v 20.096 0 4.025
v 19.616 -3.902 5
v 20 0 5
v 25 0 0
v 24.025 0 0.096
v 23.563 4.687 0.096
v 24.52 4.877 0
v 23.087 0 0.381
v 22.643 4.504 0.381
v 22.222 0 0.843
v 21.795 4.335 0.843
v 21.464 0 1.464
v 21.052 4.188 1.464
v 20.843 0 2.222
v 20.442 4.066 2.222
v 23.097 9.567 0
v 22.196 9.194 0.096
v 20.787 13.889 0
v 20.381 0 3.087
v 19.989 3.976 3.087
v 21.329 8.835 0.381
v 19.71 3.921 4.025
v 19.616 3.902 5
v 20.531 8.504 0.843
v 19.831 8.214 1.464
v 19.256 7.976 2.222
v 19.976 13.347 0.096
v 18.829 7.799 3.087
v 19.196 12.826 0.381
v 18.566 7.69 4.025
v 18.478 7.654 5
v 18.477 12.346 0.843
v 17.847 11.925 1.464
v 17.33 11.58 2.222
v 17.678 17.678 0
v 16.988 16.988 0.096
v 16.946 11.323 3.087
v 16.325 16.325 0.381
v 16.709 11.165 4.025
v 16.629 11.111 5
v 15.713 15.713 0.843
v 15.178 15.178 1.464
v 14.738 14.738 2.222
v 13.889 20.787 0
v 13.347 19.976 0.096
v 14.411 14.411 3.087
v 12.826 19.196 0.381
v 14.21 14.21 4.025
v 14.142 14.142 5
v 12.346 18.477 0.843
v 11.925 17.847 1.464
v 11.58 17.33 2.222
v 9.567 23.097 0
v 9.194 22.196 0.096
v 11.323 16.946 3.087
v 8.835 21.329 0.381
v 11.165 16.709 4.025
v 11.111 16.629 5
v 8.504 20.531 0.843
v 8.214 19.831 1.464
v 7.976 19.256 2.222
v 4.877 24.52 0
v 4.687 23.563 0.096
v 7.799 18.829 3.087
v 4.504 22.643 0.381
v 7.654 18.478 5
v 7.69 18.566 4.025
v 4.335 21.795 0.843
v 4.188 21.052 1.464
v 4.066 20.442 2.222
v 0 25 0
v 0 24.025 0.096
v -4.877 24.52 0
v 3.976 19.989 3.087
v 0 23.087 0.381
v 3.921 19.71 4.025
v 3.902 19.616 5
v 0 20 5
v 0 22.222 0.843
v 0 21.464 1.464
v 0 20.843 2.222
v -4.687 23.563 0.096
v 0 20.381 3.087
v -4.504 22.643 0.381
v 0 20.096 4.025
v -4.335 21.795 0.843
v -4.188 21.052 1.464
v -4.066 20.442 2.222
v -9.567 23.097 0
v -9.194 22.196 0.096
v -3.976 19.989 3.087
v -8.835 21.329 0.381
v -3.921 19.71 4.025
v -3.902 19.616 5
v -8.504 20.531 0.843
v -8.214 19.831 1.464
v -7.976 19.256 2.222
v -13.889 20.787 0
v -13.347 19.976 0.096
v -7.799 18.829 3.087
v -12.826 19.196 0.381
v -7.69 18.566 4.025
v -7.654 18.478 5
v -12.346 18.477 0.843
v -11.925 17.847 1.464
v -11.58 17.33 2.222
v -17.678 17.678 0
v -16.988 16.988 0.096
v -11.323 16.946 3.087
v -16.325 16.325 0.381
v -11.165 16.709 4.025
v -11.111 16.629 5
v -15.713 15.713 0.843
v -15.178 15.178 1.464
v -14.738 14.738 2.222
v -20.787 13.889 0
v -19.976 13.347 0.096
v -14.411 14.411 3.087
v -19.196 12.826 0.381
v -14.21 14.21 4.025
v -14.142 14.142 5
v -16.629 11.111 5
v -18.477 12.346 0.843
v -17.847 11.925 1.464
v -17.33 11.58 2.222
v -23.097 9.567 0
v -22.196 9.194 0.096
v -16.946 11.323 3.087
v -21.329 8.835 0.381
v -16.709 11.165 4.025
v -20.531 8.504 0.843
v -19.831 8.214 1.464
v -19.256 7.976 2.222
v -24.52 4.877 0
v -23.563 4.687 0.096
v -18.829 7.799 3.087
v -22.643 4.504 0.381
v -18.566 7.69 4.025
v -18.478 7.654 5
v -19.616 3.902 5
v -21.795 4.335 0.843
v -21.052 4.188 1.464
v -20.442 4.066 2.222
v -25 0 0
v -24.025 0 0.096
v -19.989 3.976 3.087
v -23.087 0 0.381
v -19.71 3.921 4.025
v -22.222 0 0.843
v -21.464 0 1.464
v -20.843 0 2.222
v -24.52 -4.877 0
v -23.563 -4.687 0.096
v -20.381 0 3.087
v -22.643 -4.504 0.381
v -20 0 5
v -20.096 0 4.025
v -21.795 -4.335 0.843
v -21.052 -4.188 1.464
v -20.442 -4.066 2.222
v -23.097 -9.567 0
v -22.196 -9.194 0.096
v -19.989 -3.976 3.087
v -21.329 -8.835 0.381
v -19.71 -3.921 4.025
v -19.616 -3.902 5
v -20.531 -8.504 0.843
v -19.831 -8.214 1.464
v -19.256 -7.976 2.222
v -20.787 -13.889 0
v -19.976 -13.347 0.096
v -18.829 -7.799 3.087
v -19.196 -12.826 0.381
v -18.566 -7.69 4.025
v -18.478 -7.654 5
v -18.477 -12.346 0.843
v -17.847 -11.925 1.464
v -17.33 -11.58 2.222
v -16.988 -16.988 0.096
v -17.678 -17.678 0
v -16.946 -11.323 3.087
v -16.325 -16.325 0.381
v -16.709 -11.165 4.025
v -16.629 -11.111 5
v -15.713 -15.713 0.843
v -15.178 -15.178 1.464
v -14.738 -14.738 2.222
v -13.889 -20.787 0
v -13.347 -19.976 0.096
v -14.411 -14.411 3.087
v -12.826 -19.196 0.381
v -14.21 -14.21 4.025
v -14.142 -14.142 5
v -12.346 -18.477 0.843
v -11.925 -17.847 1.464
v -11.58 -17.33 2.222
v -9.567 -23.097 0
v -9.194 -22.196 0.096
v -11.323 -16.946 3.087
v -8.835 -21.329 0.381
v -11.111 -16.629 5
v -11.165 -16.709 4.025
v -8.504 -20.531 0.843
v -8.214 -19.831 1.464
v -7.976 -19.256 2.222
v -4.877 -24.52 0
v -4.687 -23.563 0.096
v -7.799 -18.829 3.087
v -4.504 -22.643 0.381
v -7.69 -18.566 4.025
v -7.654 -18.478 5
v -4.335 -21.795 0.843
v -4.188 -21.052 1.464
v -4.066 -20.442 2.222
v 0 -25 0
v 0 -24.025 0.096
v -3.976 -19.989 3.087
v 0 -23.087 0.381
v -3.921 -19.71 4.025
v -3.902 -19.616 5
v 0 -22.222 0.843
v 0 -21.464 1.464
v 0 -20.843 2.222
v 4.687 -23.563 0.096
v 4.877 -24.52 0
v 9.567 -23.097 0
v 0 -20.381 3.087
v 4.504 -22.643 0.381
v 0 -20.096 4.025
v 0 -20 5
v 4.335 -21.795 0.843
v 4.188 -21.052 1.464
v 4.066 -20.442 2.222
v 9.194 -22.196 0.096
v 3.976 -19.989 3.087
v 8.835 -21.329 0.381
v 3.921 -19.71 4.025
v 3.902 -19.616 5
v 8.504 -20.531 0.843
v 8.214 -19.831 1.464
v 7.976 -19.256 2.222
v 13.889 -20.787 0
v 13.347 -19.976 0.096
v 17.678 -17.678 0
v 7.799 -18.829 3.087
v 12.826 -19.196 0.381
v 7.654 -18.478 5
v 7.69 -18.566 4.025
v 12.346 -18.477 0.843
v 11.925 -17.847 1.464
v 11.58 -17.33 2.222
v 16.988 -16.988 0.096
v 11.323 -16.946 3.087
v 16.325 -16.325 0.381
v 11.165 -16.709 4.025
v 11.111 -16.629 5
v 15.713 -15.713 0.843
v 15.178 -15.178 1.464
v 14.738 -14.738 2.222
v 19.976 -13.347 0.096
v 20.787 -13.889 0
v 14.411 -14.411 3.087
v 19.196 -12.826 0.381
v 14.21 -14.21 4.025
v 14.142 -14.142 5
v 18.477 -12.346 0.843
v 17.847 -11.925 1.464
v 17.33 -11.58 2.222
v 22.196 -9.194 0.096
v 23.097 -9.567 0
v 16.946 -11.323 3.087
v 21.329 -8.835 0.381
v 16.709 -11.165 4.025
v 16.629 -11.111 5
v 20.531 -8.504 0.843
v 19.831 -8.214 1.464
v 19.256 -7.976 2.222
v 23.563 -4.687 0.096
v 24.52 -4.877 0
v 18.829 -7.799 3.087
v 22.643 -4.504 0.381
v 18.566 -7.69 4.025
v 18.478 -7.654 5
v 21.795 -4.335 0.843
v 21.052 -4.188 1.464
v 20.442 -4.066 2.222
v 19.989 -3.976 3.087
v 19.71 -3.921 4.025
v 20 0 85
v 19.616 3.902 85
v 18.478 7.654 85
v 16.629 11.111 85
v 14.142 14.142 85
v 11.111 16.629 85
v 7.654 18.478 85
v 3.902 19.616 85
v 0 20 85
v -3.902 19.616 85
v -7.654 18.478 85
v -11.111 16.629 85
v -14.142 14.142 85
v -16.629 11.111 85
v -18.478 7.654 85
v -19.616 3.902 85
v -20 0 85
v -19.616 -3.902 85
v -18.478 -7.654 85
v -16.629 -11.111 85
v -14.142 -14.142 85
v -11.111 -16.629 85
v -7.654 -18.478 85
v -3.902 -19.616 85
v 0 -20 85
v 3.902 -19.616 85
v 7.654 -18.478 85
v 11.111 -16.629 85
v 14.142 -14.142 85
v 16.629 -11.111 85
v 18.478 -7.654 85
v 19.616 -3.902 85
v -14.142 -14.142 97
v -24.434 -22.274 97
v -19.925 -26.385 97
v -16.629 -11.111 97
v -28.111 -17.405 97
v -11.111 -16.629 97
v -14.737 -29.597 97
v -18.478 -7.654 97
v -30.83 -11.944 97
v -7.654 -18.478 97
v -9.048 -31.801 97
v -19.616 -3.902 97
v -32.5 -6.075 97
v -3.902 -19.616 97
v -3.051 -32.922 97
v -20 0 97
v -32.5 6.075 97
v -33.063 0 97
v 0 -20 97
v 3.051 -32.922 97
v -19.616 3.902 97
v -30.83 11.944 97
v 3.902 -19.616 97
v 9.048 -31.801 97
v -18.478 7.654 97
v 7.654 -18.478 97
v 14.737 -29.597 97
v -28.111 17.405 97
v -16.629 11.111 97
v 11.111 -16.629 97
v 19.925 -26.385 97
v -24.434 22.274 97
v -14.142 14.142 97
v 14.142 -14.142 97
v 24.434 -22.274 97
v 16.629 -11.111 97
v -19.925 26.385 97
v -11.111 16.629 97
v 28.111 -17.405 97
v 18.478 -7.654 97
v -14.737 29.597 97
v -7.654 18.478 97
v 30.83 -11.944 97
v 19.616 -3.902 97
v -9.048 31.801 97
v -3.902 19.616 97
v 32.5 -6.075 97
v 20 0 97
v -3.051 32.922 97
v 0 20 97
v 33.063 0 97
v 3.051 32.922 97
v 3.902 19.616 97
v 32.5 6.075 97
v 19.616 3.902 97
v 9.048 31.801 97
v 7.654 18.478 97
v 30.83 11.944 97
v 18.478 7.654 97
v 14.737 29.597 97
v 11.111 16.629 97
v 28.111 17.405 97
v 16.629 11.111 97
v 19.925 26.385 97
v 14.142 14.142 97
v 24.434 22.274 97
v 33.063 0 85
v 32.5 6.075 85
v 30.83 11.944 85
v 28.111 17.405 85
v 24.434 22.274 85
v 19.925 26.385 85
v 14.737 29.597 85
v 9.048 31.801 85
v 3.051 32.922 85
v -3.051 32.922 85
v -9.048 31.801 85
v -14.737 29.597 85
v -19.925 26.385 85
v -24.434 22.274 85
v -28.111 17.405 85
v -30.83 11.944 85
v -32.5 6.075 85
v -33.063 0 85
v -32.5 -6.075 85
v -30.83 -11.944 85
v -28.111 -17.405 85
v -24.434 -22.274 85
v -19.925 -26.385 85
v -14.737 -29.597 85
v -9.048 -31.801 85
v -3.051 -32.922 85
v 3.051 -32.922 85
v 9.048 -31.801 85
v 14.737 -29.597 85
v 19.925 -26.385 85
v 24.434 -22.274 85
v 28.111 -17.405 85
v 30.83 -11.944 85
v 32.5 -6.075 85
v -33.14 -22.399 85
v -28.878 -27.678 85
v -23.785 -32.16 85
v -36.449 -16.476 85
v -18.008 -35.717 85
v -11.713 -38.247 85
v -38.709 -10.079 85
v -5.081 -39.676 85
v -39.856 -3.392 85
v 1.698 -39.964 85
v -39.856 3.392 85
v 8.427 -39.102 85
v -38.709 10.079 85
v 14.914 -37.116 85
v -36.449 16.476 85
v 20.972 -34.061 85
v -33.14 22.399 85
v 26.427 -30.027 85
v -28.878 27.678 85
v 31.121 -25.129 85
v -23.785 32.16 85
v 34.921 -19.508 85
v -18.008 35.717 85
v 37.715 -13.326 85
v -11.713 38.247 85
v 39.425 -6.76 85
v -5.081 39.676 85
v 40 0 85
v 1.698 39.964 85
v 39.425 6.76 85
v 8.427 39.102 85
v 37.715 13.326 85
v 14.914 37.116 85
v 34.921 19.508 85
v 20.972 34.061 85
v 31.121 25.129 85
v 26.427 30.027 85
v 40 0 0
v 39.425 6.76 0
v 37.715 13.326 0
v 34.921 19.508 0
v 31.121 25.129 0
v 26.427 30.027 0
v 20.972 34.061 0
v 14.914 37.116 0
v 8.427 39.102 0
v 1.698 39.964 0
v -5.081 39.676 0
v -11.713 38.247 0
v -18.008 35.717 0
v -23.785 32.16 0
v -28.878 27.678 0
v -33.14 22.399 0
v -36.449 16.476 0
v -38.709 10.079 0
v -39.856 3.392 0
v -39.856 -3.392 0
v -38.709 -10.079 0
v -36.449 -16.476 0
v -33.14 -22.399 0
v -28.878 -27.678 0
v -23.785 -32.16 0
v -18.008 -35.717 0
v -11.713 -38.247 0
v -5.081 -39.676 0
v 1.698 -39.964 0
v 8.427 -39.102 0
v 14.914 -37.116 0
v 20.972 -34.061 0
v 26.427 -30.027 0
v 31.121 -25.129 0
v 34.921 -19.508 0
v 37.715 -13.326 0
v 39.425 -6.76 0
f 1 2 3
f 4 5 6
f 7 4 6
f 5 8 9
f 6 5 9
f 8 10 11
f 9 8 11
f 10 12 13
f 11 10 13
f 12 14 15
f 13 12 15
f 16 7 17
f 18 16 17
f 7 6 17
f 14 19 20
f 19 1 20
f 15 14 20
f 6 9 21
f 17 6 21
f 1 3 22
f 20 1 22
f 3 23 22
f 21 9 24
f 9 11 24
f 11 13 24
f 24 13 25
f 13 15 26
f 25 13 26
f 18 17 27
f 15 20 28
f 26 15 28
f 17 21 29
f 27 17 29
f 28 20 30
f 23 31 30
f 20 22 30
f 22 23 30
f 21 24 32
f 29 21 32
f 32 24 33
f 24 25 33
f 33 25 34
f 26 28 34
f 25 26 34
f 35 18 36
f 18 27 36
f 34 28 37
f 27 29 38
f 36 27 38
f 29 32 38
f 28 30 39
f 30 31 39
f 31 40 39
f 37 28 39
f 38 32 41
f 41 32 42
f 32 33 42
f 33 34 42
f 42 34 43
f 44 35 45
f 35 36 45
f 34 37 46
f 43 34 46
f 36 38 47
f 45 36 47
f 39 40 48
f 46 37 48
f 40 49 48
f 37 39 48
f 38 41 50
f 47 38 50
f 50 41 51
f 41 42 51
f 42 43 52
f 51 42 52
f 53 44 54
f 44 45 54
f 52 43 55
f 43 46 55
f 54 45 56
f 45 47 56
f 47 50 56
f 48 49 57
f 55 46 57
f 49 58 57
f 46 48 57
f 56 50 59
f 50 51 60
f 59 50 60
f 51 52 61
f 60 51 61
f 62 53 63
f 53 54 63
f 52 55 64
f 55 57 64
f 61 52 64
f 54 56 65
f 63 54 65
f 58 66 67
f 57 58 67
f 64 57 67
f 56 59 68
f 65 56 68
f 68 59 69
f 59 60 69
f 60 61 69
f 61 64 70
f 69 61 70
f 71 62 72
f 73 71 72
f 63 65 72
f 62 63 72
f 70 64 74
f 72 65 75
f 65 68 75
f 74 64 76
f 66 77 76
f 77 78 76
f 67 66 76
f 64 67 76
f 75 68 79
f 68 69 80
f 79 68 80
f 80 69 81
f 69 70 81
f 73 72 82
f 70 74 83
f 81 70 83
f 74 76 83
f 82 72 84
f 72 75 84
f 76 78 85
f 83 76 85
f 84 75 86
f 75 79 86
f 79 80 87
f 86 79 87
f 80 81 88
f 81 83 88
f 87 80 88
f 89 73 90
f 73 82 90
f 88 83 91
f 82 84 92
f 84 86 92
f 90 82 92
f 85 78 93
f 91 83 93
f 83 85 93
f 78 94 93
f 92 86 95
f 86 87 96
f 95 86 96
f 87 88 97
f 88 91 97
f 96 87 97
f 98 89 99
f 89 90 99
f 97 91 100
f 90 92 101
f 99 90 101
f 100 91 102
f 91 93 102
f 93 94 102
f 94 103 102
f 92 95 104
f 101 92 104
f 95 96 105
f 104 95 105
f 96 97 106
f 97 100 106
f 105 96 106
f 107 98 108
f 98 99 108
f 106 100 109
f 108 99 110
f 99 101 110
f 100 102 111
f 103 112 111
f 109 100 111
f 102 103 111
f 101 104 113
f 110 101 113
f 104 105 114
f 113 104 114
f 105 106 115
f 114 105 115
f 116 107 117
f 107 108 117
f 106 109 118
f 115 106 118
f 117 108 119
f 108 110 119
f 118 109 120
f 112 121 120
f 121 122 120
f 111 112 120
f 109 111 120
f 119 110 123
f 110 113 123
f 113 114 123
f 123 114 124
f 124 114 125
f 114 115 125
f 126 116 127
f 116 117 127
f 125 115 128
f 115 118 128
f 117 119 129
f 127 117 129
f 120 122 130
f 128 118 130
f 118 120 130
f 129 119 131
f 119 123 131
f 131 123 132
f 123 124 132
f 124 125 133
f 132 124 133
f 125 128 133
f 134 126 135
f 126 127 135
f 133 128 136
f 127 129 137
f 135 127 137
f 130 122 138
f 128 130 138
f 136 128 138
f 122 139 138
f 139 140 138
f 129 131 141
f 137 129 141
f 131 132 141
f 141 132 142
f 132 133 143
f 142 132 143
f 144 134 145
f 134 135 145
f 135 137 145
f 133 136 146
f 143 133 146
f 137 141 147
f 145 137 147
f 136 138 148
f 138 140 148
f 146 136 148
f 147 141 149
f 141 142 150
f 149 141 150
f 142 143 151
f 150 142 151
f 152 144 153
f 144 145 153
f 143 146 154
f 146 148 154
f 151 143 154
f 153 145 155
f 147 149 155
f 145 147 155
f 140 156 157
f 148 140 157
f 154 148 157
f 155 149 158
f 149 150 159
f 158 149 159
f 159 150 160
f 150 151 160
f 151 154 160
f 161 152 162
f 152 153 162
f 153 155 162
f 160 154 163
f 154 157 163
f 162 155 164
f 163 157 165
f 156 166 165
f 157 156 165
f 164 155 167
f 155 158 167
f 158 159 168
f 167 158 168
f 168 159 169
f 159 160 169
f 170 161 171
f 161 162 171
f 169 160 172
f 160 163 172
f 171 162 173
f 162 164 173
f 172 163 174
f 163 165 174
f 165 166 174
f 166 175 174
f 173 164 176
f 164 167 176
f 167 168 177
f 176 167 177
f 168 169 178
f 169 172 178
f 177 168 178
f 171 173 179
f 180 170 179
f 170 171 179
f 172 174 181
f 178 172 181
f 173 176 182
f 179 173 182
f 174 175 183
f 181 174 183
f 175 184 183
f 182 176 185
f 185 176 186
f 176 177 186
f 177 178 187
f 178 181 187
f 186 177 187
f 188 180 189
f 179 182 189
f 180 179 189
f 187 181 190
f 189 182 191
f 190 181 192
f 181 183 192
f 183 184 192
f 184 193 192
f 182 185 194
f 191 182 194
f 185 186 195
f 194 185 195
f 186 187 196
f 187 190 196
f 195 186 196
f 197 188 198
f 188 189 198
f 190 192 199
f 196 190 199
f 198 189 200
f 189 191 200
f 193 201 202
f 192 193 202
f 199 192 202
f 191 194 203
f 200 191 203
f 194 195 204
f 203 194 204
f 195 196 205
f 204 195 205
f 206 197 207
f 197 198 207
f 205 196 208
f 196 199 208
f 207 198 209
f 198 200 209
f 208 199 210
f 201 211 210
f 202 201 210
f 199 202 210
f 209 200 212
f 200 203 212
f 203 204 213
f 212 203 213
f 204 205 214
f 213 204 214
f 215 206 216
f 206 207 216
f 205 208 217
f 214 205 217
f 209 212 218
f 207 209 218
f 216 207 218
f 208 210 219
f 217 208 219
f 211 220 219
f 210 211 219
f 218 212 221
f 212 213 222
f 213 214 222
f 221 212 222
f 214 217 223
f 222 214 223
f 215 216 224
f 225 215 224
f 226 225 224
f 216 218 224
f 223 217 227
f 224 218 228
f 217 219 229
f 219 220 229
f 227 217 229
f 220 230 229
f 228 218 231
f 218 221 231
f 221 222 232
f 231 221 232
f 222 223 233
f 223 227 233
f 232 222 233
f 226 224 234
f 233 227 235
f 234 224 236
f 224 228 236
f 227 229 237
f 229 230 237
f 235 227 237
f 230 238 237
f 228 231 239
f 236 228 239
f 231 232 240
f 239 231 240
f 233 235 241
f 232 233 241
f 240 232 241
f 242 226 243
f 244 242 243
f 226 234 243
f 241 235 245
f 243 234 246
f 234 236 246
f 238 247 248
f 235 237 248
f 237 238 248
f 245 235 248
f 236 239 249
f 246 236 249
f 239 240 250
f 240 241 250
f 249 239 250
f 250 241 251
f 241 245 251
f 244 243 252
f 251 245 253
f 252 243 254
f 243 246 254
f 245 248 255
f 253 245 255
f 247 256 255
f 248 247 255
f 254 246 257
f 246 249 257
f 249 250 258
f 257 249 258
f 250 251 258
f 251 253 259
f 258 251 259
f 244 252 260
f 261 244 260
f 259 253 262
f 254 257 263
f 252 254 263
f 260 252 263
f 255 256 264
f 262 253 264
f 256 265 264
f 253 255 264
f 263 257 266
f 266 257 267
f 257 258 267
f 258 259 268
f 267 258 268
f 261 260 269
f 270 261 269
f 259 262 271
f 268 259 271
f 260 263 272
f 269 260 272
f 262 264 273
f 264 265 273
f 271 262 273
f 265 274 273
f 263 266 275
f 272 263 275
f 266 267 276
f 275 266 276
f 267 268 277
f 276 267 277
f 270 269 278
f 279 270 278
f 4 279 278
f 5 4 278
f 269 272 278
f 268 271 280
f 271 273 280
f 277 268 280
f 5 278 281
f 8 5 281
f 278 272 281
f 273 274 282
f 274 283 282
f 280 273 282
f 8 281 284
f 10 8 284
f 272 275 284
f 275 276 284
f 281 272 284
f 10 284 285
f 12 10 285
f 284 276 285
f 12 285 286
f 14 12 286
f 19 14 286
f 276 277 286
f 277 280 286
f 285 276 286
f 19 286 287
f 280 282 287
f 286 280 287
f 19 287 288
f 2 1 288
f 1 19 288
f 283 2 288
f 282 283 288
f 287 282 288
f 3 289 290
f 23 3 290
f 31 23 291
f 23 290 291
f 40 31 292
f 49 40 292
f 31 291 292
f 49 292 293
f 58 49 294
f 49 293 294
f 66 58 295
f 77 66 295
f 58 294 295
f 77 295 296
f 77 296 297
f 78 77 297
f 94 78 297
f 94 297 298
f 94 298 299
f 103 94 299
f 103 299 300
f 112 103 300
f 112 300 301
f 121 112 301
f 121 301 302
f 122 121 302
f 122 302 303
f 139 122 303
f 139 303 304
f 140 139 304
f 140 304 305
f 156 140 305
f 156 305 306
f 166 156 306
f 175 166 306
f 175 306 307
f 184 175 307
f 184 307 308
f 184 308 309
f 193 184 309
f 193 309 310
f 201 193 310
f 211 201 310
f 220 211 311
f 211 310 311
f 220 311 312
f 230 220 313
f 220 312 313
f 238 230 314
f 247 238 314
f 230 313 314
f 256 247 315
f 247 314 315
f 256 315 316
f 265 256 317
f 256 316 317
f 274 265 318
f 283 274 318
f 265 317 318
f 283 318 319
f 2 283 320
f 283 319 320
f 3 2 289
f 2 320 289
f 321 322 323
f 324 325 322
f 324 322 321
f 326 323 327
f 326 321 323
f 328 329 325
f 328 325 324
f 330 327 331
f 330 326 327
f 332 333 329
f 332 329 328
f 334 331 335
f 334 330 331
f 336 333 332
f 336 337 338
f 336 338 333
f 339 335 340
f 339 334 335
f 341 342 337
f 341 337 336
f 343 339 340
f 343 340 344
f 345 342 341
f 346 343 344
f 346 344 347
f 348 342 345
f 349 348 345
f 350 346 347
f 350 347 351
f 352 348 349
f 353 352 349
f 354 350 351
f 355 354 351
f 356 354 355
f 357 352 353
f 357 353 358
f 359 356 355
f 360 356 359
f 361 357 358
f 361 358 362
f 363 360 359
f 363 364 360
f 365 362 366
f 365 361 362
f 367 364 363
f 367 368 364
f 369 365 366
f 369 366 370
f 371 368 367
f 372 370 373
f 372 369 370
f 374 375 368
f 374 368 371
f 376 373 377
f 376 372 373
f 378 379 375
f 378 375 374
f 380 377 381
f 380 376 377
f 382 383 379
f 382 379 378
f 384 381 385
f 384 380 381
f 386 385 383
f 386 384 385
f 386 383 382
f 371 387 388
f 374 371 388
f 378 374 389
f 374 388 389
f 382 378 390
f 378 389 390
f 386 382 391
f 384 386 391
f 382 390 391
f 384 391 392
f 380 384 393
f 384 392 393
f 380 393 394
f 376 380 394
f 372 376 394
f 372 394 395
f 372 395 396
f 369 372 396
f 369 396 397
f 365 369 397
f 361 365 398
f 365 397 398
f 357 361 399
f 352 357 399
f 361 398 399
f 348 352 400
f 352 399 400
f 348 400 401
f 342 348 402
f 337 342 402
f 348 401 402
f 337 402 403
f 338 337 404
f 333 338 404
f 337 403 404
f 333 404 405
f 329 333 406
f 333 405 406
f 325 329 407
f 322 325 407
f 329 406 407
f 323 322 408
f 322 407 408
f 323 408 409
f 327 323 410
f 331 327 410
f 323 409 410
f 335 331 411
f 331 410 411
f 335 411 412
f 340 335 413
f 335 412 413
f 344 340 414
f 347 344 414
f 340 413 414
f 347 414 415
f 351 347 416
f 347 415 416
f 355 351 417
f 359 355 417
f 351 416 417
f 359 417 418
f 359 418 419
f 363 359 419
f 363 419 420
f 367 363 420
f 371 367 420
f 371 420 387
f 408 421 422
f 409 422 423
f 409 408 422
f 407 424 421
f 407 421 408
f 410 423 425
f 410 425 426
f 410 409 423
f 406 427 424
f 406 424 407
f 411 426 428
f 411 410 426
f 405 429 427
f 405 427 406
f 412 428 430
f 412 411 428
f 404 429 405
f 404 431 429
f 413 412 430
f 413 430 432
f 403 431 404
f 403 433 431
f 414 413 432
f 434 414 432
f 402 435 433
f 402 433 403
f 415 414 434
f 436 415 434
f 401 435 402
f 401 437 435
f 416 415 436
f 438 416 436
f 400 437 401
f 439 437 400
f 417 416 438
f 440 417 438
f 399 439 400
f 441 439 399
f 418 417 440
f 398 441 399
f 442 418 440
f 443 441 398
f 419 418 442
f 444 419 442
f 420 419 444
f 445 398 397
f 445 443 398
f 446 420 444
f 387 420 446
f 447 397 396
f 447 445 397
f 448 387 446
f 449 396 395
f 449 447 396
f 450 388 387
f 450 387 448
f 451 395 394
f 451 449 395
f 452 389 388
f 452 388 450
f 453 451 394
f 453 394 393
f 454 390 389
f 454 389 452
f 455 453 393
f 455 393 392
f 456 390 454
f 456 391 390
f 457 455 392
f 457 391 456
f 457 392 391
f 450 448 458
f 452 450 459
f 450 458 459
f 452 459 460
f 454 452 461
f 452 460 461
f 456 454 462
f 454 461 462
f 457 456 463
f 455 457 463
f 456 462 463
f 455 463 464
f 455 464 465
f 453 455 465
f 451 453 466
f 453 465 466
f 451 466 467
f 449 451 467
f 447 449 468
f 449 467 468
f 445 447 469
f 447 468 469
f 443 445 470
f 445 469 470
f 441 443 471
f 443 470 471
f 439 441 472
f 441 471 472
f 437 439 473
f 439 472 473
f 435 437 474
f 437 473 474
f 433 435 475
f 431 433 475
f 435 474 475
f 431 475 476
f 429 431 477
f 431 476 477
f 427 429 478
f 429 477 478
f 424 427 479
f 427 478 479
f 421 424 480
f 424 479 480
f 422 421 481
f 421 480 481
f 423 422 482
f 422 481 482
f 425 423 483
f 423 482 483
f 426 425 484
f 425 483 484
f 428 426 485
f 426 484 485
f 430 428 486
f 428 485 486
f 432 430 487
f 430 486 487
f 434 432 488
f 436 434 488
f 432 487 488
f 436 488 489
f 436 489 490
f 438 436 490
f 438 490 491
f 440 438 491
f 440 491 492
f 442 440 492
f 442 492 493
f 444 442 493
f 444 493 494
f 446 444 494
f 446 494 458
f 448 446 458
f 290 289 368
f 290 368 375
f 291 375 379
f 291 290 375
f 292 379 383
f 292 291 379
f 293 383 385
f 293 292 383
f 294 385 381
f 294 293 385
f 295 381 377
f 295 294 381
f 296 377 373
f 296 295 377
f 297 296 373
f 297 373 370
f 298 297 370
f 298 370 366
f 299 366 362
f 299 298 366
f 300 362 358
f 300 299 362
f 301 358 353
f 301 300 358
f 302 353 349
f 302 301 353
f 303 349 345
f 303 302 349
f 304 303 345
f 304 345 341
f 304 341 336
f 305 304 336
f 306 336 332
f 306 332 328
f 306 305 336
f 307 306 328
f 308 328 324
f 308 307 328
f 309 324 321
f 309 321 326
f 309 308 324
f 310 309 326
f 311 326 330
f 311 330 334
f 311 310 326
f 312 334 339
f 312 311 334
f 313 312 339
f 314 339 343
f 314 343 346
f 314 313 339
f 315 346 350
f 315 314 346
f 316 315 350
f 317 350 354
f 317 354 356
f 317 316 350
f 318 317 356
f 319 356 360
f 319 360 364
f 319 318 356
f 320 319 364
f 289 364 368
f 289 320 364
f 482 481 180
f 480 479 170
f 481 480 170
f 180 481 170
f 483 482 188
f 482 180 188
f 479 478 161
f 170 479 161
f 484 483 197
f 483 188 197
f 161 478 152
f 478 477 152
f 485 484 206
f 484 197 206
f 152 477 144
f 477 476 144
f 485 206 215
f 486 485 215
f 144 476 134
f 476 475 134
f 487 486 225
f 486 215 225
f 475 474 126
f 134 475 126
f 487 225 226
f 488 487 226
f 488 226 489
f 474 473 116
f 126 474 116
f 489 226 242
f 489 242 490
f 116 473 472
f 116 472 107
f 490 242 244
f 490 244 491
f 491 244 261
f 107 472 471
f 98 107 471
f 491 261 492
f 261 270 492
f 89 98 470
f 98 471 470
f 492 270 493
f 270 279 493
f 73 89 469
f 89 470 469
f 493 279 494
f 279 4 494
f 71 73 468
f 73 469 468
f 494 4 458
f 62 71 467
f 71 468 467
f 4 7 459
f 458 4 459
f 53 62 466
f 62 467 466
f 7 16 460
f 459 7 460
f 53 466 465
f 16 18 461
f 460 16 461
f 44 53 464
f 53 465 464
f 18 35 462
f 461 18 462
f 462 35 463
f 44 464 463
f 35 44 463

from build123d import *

# Parameters (mm, degrees)
F0_R     = 40
F1_DEPTH = 85
F2_R     = 20
F3_DEPTH = 88
F4_R     = 5
F5_R     = 33.0630902993
F5_R_2   = 20
F6_DEPTH = 12


with BuildPart() as f1:
    # F0 (on Top) → F1 (new body)
    with BuildSketch(Plane.XY):
        Circle(F0_R)
    extrude(amount=F1_DEPTH)

    # F2 (on face) → F3 (cut)
    with BuildSketch(Plane.XY.offset(85)):
        Circle(F2_R)
    extrude(amount=-F3_DEPTH, mode=Mode.SUBTRACT)

    # F4
    f4_edges = [f1.edges().sort_by_distance(p)[0] for p in [
        (-20, 0, 0),
    ]]
    fillet(f4_edges, radius=F4_R)

    # F5 (on face) → F6 (join)
    with BuildSketch(Plane.XY.offset(85)):
        Circle(F5_R)
        Circle(F5_R_2, mode=Mode.SUBTRACT)
    extrude(amount=F6_DEPTH)


solid = f1.part
